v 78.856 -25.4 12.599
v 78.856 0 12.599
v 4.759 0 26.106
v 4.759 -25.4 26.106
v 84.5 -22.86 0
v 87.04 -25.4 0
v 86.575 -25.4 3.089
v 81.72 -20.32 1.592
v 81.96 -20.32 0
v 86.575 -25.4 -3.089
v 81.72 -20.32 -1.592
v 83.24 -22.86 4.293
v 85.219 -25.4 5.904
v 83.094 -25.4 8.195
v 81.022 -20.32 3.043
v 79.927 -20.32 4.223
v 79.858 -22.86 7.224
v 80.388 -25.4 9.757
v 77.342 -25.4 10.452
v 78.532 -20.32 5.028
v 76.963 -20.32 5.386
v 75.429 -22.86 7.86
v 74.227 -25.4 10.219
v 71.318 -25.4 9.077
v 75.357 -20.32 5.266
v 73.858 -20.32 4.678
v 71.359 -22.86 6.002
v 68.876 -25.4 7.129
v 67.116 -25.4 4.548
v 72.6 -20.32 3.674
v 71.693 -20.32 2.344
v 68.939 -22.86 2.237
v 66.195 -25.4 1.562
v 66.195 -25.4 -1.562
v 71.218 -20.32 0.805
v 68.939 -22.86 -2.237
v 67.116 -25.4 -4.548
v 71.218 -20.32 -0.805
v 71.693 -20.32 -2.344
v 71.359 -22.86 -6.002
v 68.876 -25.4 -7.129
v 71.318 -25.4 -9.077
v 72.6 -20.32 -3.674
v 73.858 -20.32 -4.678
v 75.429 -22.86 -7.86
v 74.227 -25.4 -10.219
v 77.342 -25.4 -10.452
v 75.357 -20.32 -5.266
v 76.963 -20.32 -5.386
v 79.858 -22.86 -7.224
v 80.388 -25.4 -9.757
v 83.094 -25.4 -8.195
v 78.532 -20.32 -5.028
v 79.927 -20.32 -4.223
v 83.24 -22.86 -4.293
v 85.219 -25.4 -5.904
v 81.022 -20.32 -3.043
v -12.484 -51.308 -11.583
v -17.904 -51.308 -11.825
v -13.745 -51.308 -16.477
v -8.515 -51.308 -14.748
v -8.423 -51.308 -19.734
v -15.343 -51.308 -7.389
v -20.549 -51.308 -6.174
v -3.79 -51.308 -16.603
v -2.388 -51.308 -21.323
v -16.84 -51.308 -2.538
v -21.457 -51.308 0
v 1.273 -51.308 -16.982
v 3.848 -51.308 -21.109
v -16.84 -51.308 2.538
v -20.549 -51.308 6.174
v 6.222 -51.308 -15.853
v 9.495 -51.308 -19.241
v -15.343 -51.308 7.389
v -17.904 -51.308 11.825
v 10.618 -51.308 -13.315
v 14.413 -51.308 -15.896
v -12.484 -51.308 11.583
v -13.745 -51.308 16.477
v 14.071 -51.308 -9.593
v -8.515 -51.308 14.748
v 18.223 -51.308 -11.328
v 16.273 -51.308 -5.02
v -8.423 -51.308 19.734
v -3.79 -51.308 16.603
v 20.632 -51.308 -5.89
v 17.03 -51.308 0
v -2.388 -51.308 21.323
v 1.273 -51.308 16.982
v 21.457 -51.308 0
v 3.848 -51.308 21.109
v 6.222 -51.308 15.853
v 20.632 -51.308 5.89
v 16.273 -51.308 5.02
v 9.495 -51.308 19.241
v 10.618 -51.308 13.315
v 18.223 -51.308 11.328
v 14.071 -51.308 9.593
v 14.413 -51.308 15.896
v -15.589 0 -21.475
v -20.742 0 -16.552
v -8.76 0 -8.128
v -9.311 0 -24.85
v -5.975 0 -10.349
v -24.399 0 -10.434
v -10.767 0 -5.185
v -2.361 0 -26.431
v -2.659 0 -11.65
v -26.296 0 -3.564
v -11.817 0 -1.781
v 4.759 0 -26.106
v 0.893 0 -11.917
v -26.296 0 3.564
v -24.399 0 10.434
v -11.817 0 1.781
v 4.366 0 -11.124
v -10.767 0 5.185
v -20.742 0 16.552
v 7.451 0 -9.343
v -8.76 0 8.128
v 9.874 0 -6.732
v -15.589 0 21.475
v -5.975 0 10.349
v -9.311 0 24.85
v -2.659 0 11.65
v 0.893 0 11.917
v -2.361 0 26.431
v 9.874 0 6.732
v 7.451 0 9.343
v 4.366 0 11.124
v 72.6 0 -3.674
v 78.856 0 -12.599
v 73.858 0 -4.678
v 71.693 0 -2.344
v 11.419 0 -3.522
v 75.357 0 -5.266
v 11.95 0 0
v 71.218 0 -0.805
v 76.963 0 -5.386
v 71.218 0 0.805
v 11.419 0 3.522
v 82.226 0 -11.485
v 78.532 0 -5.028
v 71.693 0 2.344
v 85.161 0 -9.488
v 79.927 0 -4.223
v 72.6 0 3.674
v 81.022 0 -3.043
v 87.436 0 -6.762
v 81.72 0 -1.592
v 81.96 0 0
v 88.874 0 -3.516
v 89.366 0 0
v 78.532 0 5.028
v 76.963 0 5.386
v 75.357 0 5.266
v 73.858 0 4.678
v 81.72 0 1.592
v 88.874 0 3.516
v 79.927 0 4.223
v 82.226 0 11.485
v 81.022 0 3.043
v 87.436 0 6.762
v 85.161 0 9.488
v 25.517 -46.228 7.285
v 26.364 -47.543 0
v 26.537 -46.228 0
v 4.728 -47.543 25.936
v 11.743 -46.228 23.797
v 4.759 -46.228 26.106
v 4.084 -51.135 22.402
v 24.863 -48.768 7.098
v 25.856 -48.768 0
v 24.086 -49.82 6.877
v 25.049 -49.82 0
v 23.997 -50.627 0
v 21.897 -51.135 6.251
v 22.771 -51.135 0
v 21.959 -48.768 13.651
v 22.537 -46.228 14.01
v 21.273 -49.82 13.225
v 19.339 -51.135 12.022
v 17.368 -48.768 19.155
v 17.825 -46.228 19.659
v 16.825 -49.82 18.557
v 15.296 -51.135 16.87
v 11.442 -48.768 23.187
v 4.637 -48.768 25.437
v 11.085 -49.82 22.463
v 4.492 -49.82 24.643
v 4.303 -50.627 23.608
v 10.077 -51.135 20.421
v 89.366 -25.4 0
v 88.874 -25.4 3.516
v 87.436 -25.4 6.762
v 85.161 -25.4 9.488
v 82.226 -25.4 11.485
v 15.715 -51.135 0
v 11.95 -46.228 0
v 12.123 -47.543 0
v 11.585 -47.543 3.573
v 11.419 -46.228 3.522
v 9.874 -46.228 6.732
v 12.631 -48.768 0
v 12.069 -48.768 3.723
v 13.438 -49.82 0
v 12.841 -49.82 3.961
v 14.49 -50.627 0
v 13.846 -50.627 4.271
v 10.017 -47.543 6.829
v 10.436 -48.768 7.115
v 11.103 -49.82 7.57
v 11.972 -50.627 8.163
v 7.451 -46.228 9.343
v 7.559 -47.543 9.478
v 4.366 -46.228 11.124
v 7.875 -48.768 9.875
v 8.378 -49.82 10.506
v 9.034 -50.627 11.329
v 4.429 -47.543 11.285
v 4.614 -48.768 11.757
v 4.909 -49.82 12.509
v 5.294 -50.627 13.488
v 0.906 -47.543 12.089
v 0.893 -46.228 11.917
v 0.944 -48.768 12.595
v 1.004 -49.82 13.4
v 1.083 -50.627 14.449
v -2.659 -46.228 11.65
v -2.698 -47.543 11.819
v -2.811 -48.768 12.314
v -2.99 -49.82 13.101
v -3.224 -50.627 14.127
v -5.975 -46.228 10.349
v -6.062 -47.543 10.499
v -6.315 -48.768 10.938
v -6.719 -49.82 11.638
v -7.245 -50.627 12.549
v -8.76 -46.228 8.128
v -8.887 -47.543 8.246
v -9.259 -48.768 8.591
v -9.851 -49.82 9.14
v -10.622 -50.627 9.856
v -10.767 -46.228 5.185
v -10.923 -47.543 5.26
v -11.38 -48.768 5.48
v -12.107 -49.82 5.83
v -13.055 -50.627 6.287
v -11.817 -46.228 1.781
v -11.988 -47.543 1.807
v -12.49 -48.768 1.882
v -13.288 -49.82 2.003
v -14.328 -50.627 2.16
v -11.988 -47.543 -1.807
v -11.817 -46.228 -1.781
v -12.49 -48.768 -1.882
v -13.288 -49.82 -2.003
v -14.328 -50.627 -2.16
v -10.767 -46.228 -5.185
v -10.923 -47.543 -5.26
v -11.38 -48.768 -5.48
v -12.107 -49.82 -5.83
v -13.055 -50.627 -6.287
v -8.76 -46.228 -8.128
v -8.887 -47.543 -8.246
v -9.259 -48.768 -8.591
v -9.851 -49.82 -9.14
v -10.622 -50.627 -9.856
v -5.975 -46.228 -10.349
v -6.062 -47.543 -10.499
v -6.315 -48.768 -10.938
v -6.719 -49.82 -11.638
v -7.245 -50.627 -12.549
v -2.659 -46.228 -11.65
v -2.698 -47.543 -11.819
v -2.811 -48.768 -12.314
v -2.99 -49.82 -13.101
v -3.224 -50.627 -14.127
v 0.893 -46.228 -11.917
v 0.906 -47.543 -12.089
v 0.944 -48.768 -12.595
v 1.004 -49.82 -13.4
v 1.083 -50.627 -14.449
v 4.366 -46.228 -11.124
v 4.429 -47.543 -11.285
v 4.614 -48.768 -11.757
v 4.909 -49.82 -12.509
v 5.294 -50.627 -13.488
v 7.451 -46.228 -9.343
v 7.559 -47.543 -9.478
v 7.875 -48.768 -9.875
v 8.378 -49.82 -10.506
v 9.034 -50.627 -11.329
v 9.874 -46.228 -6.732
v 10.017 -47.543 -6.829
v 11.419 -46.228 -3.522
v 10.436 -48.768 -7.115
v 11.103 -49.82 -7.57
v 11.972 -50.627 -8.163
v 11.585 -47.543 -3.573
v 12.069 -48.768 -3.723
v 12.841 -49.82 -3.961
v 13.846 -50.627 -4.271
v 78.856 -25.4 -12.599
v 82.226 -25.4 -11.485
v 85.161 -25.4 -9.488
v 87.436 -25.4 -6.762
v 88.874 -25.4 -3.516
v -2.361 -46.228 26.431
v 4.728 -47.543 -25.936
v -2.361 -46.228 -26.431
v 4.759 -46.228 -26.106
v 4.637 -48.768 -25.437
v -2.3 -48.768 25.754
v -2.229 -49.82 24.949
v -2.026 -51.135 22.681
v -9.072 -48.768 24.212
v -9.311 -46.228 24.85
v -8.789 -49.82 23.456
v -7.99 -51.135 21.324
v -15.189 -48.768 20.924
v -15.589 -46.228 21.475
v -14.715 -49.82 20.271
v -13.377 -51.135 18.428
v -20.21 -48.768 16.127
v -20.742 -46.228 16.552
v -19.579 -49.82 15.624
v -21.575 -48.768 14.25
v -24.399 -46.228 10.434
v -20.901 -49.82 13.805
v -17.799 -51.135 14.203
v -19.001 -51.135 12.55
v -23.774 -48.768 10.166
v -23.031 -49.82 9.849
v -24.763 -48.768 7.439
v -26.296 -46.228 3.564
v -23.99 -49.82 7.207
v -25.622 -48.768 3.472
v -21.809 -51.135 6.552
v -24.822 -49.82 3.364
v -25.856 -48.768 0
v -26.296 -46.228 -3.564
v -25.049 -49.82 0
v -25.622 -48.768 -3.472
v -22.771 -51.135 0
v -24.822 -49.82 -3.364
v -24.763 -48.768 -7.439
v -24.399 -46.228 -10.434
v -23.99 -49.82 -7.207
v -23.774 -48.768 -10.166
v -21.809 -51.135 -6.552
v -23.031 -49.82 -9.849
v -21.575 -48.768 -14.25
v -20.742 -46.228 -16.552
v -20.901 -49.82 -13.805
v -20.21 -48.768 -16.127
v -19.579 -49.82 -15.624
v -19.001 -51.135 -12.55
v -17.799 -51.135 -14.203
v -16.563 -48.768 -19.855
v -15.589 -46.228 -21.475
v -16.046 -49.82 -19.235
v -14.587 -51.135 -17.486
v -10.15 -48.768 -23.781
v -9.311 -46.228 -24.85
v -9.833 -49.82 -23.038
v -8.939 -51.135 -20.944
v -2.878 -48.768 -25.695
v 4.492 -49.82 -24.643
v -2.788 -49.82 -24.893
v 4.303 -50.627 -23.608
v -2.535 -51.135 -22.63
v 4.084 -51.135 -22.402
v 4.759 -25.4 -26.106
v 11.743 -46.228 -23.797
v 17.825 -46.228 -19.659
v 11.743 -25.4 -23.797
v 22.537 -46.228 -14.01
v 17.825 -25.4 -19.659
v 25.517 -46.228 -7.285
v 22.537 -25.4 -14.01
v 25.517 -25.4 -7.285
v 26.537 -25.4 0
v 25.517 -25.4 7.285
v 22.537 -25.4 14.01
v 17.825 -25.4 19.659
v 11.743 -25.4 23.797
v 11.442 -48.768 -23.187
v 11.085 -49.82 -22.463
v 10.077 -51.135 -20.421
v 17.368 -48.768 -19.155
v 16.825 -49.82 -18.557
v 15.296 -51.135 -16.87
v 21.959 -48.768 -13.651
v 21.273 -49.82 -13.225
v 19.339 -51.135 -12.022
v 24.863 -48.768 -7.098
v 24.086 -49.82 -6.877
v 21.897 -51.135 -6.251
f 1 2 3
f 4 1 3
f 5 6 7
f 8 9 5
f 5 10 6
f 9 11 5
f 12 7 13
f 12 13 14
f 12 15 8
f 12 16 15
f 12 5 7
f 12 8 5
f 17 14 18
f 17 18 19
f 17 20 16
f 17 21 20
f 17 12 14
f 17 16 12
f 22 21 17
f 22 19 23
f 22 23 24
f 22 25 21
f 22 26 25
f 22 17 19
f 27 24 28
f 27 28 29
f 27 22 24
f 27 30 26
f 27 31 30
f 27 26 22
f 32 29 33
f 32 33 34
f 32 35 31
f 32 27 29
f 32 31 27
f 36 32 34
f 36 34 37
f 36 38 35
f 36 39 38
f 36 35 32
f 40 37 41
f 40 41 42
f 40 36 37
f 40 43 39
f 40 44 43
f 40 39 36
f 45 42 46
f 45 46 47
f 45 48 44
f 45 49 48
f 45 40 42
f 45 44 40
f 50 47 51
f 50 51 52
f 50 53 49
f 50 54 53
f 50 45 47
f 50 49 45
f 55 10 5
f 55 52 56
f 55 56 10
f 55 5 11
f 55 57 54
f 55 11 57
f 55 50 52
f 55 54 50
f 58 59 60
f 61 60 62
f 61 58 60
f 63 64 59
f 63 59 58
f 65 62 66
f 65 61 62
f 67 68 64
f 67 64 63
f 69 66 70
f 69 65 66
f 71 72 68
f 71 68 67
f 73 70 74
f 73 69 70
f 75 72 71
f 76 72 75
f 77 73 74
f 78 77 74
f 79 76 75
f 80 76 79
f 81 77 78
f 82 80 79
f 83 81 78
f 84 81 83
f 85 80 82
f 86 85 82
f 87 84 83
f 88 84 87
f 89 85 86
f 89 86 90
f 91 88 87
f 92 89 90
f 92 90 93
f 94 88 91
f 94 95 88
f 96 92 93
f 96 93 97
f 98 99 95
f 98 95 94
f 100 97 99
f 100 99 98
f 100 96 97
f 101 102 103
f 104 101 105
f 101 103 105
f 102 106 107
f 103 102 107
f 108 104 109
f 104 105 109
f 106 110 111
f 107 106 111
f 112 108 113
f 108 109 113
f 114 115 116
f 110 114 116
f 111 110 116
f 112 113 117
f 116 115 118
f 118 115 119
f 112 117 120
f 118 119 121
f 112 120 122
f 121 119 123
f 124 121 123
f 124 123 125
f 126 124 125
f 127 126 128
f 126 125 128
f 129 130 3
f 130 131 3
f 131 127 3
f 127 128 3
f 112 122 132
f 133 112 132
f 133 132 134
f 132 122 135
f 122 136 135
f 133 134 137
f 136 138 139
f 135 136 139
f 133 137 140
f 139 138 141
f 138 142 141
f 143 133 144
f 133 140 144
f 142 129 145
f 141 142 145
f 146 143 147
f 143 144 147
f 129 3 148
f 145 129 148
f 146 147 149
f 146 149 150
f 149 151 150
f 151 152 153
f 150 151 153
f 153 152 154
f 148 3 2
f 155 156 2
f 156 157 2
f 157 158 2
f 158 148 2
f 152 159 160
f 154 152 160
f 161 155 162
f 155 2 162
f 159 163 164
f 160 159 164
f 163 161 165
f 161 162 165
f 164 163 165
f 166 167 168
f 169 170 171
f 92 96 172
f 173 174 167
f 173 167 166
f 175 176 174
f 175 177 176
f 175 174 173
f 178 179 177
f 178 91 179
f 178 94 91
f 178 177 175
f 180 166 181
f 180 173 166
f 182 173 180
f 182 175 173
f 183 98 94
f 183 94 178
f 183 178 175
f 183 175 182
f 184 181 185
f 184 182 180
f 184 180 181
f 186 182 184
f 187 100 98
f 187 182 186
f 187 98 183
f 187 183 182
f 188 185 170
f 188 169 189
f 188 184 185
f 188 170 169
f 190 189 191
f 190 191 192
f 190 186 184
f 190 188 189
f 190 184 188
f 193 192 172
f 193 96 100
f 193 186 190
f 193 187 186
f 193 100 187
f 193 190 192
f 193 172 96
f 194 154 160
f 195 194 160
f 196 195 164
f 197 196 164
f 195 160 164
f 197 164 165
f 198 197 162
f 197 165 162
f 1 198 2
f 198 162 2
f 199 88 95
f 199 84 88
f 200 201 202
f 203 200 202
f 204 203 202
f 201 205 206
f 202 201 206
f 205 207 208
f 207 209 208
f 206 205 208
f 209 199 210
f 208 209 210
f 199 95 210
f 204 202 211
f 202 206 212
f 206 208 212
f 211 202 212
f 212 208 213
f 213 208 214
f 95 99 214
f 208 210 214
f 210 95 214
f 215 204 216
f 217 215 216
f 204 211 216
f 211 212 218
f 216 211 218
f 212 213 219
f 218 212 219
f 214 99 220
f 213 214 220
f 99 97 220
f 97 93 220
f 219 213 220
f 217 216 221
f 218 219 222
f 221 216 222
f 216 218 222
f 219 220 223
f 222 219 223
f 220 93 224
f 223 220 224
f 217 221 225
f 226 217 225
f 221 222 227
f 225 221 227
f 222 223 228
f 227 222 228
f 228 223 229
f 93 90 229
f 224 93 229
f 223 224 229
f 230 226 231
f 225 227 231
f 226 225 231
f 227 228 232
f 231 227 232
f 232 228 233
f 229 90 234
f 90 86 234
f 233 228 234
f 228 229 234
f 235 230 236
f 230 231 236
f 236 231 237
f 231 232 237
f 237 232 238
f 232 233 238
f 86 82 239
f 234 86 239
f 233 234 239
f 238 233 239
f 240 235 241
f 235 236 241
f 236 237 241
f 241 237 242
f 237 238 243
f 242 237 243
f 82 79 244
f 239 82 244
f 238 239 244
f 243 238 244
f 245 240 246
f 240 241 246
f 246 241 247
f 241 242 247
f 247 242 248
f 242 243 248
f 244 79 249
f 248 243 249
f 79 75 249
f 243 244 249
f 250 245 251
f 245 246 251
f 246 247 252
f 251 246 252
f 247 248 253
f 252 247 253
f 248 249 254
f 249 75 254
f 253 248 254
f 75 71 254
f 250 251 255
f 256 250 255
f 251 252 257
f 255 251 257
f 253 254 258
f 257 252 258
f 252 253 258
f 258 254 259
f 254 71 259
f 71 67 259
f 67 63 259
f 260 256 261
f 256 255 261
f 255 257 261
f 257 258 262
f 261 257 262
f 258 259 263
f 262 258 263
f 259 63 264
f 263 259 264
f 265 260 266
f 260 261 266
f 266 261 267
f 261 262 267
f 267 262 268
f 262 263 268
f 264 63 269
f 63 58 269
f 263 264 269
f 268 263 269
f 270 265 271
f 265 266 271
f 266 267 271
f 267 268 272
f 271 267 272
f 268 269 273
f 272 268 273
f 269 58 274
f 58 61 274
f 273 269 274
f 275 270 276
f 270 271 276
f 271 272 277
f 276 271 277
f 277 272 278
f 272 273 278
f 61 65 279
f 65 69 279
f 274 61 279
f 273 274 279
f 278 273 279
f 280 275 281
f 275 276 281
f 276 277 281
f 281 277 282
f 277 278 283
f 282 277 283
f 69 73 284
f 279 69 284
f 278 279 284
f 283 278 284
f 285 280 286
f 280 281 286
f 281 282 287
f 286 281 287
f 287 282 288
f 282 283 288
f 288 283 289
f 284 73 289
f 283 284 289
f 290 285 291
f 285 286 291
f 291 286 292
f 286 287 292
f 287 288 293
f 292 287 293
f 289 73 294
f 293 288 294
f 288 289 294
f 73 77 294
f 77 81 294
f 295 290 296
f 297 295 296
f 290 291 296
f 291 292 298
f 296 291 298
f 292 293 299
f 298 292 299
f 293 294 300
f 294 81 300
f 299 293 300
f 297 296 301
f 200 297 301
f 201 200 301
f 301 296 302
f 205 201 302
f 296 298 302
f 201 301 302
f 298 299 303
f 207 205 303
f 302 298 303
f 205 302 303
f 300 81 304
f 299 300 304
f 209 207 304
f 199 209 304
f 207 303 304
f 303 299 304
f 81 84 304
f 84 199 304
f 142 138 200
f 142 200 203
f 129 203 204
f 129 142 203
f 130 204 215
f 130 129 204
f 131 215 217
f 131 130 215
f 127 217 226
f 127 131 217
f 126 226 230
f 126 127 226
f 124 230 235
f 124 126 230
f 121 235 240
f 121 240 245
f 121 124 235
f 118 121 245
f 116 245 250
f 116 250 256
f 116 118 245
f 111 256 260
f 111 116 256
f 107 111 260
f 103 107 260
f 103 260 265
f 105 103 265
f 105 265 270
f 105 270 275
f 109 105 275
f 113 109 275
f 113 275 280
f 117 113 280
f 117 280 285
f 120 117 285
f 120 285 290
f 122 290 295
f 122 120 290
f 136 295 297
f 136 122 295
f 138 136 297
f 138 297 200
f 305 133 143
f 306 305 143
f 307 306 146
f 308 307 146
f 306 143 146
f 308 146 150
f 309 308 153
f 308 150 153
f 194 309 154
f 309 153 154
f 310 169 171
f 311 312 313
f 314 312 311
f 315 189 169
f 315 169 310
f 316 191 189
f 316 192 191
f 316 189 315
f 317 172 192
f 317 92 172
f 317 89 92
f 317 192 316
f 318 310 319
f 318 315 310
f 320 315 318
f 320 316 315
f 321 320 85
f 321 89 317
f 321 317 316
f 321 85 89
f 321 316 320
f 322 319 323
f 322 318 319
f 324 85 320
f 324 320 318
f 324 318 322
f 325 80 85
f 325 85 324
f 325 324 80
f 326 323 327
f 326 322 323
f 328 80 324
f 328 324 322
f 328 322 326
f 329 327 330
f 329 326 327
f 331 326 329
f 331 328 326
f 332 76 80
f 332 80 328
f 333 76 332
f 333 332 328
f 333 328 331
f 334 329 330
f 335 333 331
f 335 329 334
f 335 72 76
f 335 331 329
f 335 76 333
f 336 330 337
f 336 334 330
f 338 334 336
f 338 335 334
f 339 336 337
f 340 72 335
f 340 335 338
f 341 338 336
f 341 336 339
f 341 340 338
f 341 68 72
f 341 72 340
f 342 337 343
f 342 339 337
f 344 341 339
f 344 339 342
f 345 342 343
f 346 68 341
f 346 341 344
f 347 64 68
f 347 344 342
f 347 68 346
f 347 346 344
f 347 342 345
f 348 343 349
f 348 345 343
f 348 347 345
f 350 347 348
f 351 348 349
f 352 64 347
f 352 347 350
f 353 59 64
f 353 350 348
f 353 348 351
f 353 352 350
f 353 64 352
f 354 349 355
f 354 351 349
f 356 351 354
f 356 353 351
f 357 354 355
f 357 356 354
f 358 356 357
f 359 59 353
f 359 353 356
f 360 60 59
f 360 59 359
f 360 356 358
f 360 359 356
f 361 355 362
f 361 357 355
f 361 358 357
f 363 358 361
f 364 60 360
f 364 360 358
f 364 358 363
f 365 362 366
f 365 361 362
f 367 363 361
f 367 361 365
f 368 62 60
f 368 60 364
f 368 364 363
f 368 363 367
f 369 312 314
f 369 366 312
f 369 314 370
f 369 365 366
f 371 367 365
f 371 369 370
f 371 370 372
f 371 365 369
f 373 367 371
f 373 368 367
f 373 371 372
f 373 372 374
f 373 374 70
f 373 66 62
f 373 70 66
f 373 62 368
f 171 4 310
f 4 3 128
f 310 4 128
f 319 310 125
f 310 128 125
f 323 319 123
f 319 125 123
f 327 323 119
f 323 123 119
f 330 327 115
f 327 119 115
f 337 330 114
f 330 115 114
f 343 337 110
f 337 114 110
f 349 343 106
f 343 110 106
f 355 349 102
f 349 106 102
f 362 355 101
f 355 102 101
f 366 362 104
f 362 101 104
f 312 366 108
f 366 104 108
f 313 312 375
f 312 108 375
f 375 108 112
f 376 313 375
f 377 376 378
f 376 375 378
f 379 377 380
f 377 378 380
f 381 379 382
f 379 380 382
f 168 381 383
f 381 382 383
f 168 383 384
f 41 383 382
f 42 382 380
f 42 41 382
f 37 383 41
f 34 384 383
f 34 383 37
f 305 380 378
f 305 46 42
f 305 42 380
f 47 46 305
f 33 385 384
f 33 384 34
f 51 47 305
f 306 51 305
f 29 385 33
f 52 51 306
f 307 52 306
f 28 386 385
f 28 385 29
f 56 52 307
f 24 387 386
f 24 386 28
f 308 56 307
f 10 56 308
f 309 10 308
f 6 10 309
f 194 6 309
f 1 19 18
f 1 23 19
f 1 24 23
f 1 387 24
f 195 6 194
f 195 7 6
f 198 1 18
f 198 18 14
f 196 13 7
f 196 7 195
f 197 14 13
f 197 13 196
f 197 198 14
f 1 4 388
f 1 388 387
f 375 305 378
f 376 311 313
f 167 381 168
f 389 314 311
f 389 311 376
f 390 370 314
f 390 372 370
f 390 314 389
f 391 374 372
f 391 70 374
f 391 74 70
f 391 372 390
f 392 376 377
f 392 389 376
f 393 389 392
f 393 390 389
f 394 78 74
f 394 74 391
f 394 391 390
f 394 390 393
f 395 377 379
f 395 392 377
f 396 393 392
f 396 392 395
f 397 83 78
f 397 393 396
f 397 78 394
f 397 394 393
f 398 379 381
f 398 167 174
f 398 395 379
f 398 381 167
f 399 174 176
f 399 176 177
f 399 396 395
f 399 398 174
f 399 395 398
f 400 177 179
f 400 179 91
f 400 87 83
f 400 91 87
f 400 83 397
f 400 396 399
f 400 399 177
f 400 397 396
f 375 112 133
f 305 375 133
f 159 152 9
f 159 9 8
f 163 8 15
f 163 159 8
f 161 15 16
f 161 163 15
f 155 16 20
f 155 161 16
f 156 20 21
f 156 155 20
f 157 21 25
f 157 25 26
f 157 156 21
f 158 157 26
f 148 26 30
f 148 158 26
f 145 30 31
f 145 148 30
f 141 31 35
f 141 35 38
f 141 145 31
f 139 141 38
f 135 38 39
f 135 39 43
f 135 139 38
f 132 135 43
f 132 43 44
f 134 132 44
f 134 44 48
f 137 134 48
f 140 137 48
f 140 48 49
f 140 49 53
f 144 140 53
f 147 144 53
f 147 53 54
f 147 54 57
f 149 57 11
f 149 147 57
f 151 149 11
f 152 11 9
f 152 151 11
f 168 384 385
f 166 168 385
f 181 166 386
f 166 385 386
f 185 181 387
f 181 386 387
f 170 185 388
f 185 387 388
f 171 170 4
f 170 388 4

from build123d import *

# Parameters (mm, degrees)
F0_R     = 11.949999
F0_R_2   = 5.401318
F1_DEPTH = 25.4
F2_DEPTH = 51.308
F3_R     = 5.08
F4_SIZE  = 5.08


with BuildPart() as f1:
    # F0 (on Front) → F1 (new body)
    with BuildSketch(Plane.XZ):
        with BuildLine():
            ThreePointArc((4.758947, -26.106481), (20.377471, -16.998665), (26.53669, 0))
            ThreePointArc((26.53669, 0), (20.377471, 16.998665), (4.758947, 26.106481))
            ThreePointArc((4.758947, 26.106481), (-26.53669, 0), (4.758947, -26.106481))
        make_face()
        Circle(F0_R, mode=Mode.SUBTRACT)
        with BuildLine():
            ThreePointArc((4.758947, 26.106481), (20.377471, 16.998665), (26.53669, 0))
            ThreePointArc((26.53669, 0), (20.377471, -16.998665), (4.758947, -26.106481))
            Line((4.758947, -26.106481), (78.85573, -12.599387))
            ThreePointArc((78.85573, -12.599387), (63.751977, 0), (78.85573, 12.599387))
            Line((78.85573, 12.599387), (4.758947, 26.106481))
        make_face()
        with BuildLine():
            ThreePointArc((89.366002, 0), (86.393468, 8.203815), (78.85573, 12.599387))
            ThreePointArc((78.85573, 12.599387), (63.751977, 0), (78.85573, -12.599387))
            ThreePointArc((78.85573, -12.599387), (86.393468, -8.203815), (89.366002, 0))
        make_face()
        with Locations((76.55899, 0)):
            Circle(F0_R_2, mode=Mode.SUBTRACT)
    extrude(amount=F1_DEPTH)

    # F0 (on Front) → F2 (join)
    with BuildSketch(Plane.XZ):
        with BuildLine():
            ThreePointArc((4.758947, -26.106481), (20.377471, -16.998665), (26.53669, 0))
            ThreePointArc((26.53669, 0), (20.377471, 16.998665), (4.758947, 26.106481))
            ThreePointArc((4.758947, 26.106481), (-26.53669, 0), (4.758947, -26.106481))
        make_face()
        Circle(F0_R, mode=Mode.SUBTRACT)
    extrude(amount=F2_DEPTH)

    # F3
    f3_edges = [f1.edges().sort_by_distance(p)[0] for p in [
        (-4.758947, -51.308, 26.106481),
        (-11.949999, -51.308, 0),
    ]]
    fillet(f3_edges, radius=F3_R)

    # F4
    f4_edges = [f1.edges().sort_by_distance(p)[0] for p in [
        (71.157671, -25.4, 0),
    ]]
    chamfer(f4_edges, length=F4_SIZE)


solid = f1.part
